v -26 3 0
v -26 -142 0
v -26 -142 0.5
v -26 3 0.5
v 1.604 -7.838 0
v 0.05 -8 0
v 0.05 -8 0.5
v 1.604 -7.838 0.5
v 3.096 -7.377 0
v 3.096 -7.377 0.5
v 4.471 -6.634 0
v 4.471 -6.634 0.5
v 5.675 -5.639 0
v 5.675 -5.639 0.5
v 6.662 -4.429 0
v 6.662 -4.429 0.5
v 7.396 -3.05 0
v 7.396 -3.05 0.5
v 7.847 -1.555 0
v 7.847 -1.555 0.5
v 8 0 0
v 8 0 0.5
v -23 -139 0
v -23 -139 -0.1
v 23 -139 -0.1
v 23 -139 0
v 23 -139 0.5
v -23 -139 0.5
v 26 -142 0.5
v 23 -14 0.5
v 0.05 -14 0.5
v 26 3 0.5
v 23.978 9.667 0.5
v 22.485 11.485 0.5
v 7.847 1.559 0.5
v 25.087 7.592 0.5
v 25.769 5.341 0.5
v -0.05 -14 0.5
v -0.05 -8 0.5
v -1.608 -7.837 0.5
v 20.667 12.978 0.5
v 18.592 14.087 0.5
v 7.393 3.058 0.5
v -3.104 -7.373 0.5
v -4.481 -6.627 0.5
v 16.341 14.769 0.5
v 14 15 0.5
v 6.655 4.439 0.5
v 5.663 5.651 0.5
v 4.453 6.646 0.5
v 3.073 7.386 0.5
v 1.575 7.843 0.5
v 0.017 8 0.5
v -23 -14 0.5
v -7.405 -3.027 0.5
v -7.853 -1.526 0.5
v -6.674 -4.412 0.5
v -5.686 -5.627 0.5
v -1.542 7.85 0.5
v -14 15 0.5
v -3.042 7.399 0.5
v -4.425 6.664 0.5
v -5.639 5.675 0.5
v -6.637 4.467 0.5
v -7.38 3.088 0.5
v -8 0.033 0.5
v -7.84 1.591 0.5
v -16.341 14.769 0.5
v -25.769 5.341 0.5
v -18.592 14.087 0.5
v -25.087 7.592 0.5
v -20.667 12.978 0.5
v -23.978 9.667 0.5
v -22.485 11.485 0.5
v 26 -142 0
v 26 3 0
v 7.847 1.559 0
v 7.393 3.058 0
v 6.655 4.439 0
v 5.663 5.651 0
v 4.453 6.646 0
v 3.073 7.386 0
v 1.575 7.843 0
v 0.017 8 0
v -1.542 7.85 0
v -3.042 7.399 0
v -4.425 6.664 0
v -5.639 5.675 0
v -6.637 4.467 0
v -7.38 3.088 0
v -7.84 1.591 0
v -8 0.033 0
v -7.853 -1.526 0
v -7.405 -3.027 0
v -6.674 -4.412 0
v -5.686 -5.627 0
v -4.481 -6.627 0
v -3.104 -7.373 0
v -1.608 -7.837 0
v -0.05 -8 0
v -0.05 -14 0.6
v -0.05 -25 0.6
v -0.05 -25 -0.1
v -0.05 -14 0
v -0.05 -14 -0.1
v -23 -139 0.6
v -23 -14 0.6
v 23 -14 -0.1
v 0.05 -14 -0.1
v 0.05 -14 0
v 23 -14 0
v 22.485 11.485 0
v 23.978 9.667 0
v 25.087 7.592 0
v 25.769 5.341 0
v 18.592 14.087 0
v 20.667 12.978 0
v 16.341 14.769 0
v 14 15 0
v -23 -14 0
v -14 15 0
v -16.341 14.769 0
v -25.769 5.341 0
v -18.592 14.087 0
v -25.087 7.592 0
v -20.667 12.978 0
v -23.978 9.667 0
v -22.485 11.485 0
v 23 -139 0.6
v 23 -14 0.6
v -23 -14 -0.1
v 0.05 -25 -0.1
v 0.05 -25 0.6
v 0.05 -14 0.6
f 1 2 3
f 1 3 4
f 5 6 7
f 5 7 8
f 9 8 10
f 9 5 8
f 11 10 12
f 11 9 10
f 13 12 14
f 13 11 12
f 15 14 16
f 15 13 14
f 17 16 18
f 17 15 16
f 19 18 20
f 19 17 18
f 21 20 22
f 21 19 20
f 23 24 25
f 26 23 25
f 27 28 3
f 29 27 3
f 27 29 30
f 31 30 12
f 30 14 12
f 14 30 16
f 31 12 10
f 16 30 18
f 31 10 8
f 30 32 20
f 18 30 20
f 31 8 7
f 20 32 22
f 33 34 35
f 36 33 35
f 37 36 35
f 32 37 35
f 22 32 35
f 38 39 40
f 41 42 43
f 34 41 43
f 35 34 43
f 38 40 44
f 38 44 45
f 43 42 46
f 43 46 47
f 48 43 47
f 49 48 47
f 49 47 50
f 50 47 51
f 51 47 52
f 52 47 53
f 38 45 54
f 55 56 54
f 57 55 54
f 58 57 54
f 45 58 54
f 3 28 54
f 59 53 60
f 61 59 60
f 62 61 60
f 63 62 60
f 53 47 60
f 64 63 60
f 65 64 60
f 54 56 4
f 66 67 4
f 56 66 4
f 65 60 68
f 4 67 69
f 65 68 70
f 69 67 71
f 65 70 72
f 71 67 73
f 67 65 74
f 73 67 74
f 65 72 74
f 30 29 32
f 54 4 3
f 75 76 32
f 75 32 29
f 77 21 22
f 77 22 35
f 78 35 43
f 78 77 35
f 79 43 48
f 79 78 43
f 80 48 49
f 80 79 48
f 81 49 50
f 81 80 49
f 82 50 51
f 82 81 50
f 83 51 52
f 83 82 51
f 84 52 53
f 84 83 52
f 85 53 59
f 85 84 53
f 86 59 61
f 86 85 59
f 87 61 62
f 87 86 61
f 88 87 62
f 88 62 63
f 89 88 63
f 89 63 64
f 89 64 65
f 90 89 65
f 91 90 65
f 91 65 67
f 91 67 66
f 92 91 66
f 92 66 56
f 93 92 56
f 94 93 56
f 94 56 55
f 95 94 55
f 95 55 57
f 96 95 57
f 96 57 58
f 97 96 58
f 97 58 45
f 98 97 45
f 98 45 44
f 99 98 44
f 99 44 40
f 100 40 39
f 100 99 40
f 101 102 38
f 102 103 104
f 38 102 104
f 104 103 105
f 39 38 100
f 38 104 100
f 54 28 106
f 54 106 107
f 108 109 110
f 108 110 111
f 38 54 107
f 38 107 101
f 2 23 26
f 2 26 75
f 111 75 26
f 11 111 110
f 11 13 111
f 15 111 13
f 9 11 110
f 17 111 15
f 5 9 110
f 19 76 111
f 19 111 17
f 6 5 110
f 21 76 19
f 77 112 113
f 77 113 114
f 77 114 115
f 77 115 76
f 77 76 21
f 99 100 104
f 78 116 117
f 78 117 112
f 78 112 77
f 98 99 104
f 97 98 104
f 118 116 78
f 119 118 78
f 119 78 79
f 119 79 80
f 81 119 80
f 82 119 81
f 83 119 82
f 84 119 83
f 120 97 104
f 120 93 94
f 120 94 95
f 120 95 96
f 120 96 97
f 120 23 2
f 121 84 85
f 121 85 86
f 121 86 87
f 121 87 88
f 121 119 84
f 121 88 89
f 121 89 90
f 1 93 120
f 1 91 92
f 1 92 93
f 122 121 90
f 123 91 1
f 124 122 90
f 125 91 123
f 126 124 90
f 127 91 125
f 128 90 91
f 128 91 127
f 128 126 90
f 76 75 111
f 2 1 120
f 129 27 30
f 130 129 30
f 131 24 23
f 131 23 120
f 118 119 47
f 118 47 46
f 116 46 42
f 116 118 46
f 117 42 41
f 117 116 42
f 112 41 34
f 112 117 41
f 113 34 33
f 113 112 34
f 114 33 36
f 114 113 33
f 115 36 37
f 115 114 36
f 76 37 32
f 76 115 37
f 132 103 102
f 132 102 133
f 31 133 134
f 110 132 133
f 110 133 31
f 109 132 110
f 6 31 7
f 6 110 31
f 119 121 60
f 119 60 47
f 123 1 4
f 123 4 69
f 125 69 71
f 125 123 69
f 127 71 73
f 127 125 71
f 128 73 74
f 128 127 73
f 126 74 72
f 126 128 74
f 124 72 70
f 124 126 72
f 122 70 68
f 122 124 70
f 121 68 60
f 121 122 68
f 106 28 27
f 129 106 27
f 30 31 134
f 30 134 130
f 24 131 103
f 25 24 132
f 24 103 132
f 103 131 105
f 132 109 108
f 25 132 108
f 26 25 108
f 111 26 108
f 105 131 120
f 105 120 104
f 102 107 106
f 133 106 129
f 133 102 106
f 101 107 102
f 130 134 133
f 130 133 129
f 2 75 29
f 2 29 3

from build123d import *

# Parameters (mm, degrees)
SKETCH2_R                = 8
BOSS_EXTRUDE1_DEPTH      = 0.5
BOSS_EXTRUDE2_DEPTH      = 0.1
BOSS_EXTRUDE2_DEPTH_BACK = 0.6
SKETCH4_W                = 46
SKETCH4_H                = 125
CUT_EXTRUDE1_DEPTH       = 145.361906333
CUT_EXTRUDE1_DEPTH_BACK  = 145.361906333
SKETCH5_W                = 0.1
SKETCH5_H                = 25


with BuildPart() as part:
    # Sketch2 → Boss-Extrude1 (new body)
    with BuildSketch(Plane.XY):
        with BuildLine():
            Line((-14, 15), (14, 15))
            ThreePointArc((14, 15), (22.485281374, 11.485281374), (26, 3))
            Line((26, 3), (26, -142))
            Line((26, -142), (-26, -142))
            Line((-26, -142), (-26, 3))
            ThreePointArc((-26, 3), (-22.485281374, 11.485281374), (-14, 15))
        make_face()
        Circle(SKETCH2_R, mode=Mode.SUBTRACT)
    extrude(amount=BOSS_EXTRUDE1_DEPTH)

    # Sketch4 → Boss-Extrude2 (add, two sides: drawn at the far end of the back side and taken through both)
    with BuildSketch(Plane.XY.offset(0.5).offset(-BOSS_EXTRUDE2_DEPTH_BACK)):
        with Locations((0, -76.5)):
            Rectangle(SKETCH4_W, SKETCH4_H)
    extrude(amount=BOSS_EXTRUDE2_DEPTH + BOSS_EXTRUDE2_DEPTH_BACK)

    # Sketch5 → Cut-Extrude1 (cut, two sides: drawn at the far end of the back side and taken through both)
    with BuildSketch(Plane.XY.offset(0.5).offset(-CUT_EXTRUDE1_DEPTH_BACK)):
        with Locations((0, -12.5)):
            Rectangle(SKETCH5_W, SKETCH5_H)
    extrude(amount=CUT_EXTRUDE1_DEPTH + CUT_EXTRUDE1_DEPTH_BACK, mode=Mode.SUBTRACT)


solid = part.part
